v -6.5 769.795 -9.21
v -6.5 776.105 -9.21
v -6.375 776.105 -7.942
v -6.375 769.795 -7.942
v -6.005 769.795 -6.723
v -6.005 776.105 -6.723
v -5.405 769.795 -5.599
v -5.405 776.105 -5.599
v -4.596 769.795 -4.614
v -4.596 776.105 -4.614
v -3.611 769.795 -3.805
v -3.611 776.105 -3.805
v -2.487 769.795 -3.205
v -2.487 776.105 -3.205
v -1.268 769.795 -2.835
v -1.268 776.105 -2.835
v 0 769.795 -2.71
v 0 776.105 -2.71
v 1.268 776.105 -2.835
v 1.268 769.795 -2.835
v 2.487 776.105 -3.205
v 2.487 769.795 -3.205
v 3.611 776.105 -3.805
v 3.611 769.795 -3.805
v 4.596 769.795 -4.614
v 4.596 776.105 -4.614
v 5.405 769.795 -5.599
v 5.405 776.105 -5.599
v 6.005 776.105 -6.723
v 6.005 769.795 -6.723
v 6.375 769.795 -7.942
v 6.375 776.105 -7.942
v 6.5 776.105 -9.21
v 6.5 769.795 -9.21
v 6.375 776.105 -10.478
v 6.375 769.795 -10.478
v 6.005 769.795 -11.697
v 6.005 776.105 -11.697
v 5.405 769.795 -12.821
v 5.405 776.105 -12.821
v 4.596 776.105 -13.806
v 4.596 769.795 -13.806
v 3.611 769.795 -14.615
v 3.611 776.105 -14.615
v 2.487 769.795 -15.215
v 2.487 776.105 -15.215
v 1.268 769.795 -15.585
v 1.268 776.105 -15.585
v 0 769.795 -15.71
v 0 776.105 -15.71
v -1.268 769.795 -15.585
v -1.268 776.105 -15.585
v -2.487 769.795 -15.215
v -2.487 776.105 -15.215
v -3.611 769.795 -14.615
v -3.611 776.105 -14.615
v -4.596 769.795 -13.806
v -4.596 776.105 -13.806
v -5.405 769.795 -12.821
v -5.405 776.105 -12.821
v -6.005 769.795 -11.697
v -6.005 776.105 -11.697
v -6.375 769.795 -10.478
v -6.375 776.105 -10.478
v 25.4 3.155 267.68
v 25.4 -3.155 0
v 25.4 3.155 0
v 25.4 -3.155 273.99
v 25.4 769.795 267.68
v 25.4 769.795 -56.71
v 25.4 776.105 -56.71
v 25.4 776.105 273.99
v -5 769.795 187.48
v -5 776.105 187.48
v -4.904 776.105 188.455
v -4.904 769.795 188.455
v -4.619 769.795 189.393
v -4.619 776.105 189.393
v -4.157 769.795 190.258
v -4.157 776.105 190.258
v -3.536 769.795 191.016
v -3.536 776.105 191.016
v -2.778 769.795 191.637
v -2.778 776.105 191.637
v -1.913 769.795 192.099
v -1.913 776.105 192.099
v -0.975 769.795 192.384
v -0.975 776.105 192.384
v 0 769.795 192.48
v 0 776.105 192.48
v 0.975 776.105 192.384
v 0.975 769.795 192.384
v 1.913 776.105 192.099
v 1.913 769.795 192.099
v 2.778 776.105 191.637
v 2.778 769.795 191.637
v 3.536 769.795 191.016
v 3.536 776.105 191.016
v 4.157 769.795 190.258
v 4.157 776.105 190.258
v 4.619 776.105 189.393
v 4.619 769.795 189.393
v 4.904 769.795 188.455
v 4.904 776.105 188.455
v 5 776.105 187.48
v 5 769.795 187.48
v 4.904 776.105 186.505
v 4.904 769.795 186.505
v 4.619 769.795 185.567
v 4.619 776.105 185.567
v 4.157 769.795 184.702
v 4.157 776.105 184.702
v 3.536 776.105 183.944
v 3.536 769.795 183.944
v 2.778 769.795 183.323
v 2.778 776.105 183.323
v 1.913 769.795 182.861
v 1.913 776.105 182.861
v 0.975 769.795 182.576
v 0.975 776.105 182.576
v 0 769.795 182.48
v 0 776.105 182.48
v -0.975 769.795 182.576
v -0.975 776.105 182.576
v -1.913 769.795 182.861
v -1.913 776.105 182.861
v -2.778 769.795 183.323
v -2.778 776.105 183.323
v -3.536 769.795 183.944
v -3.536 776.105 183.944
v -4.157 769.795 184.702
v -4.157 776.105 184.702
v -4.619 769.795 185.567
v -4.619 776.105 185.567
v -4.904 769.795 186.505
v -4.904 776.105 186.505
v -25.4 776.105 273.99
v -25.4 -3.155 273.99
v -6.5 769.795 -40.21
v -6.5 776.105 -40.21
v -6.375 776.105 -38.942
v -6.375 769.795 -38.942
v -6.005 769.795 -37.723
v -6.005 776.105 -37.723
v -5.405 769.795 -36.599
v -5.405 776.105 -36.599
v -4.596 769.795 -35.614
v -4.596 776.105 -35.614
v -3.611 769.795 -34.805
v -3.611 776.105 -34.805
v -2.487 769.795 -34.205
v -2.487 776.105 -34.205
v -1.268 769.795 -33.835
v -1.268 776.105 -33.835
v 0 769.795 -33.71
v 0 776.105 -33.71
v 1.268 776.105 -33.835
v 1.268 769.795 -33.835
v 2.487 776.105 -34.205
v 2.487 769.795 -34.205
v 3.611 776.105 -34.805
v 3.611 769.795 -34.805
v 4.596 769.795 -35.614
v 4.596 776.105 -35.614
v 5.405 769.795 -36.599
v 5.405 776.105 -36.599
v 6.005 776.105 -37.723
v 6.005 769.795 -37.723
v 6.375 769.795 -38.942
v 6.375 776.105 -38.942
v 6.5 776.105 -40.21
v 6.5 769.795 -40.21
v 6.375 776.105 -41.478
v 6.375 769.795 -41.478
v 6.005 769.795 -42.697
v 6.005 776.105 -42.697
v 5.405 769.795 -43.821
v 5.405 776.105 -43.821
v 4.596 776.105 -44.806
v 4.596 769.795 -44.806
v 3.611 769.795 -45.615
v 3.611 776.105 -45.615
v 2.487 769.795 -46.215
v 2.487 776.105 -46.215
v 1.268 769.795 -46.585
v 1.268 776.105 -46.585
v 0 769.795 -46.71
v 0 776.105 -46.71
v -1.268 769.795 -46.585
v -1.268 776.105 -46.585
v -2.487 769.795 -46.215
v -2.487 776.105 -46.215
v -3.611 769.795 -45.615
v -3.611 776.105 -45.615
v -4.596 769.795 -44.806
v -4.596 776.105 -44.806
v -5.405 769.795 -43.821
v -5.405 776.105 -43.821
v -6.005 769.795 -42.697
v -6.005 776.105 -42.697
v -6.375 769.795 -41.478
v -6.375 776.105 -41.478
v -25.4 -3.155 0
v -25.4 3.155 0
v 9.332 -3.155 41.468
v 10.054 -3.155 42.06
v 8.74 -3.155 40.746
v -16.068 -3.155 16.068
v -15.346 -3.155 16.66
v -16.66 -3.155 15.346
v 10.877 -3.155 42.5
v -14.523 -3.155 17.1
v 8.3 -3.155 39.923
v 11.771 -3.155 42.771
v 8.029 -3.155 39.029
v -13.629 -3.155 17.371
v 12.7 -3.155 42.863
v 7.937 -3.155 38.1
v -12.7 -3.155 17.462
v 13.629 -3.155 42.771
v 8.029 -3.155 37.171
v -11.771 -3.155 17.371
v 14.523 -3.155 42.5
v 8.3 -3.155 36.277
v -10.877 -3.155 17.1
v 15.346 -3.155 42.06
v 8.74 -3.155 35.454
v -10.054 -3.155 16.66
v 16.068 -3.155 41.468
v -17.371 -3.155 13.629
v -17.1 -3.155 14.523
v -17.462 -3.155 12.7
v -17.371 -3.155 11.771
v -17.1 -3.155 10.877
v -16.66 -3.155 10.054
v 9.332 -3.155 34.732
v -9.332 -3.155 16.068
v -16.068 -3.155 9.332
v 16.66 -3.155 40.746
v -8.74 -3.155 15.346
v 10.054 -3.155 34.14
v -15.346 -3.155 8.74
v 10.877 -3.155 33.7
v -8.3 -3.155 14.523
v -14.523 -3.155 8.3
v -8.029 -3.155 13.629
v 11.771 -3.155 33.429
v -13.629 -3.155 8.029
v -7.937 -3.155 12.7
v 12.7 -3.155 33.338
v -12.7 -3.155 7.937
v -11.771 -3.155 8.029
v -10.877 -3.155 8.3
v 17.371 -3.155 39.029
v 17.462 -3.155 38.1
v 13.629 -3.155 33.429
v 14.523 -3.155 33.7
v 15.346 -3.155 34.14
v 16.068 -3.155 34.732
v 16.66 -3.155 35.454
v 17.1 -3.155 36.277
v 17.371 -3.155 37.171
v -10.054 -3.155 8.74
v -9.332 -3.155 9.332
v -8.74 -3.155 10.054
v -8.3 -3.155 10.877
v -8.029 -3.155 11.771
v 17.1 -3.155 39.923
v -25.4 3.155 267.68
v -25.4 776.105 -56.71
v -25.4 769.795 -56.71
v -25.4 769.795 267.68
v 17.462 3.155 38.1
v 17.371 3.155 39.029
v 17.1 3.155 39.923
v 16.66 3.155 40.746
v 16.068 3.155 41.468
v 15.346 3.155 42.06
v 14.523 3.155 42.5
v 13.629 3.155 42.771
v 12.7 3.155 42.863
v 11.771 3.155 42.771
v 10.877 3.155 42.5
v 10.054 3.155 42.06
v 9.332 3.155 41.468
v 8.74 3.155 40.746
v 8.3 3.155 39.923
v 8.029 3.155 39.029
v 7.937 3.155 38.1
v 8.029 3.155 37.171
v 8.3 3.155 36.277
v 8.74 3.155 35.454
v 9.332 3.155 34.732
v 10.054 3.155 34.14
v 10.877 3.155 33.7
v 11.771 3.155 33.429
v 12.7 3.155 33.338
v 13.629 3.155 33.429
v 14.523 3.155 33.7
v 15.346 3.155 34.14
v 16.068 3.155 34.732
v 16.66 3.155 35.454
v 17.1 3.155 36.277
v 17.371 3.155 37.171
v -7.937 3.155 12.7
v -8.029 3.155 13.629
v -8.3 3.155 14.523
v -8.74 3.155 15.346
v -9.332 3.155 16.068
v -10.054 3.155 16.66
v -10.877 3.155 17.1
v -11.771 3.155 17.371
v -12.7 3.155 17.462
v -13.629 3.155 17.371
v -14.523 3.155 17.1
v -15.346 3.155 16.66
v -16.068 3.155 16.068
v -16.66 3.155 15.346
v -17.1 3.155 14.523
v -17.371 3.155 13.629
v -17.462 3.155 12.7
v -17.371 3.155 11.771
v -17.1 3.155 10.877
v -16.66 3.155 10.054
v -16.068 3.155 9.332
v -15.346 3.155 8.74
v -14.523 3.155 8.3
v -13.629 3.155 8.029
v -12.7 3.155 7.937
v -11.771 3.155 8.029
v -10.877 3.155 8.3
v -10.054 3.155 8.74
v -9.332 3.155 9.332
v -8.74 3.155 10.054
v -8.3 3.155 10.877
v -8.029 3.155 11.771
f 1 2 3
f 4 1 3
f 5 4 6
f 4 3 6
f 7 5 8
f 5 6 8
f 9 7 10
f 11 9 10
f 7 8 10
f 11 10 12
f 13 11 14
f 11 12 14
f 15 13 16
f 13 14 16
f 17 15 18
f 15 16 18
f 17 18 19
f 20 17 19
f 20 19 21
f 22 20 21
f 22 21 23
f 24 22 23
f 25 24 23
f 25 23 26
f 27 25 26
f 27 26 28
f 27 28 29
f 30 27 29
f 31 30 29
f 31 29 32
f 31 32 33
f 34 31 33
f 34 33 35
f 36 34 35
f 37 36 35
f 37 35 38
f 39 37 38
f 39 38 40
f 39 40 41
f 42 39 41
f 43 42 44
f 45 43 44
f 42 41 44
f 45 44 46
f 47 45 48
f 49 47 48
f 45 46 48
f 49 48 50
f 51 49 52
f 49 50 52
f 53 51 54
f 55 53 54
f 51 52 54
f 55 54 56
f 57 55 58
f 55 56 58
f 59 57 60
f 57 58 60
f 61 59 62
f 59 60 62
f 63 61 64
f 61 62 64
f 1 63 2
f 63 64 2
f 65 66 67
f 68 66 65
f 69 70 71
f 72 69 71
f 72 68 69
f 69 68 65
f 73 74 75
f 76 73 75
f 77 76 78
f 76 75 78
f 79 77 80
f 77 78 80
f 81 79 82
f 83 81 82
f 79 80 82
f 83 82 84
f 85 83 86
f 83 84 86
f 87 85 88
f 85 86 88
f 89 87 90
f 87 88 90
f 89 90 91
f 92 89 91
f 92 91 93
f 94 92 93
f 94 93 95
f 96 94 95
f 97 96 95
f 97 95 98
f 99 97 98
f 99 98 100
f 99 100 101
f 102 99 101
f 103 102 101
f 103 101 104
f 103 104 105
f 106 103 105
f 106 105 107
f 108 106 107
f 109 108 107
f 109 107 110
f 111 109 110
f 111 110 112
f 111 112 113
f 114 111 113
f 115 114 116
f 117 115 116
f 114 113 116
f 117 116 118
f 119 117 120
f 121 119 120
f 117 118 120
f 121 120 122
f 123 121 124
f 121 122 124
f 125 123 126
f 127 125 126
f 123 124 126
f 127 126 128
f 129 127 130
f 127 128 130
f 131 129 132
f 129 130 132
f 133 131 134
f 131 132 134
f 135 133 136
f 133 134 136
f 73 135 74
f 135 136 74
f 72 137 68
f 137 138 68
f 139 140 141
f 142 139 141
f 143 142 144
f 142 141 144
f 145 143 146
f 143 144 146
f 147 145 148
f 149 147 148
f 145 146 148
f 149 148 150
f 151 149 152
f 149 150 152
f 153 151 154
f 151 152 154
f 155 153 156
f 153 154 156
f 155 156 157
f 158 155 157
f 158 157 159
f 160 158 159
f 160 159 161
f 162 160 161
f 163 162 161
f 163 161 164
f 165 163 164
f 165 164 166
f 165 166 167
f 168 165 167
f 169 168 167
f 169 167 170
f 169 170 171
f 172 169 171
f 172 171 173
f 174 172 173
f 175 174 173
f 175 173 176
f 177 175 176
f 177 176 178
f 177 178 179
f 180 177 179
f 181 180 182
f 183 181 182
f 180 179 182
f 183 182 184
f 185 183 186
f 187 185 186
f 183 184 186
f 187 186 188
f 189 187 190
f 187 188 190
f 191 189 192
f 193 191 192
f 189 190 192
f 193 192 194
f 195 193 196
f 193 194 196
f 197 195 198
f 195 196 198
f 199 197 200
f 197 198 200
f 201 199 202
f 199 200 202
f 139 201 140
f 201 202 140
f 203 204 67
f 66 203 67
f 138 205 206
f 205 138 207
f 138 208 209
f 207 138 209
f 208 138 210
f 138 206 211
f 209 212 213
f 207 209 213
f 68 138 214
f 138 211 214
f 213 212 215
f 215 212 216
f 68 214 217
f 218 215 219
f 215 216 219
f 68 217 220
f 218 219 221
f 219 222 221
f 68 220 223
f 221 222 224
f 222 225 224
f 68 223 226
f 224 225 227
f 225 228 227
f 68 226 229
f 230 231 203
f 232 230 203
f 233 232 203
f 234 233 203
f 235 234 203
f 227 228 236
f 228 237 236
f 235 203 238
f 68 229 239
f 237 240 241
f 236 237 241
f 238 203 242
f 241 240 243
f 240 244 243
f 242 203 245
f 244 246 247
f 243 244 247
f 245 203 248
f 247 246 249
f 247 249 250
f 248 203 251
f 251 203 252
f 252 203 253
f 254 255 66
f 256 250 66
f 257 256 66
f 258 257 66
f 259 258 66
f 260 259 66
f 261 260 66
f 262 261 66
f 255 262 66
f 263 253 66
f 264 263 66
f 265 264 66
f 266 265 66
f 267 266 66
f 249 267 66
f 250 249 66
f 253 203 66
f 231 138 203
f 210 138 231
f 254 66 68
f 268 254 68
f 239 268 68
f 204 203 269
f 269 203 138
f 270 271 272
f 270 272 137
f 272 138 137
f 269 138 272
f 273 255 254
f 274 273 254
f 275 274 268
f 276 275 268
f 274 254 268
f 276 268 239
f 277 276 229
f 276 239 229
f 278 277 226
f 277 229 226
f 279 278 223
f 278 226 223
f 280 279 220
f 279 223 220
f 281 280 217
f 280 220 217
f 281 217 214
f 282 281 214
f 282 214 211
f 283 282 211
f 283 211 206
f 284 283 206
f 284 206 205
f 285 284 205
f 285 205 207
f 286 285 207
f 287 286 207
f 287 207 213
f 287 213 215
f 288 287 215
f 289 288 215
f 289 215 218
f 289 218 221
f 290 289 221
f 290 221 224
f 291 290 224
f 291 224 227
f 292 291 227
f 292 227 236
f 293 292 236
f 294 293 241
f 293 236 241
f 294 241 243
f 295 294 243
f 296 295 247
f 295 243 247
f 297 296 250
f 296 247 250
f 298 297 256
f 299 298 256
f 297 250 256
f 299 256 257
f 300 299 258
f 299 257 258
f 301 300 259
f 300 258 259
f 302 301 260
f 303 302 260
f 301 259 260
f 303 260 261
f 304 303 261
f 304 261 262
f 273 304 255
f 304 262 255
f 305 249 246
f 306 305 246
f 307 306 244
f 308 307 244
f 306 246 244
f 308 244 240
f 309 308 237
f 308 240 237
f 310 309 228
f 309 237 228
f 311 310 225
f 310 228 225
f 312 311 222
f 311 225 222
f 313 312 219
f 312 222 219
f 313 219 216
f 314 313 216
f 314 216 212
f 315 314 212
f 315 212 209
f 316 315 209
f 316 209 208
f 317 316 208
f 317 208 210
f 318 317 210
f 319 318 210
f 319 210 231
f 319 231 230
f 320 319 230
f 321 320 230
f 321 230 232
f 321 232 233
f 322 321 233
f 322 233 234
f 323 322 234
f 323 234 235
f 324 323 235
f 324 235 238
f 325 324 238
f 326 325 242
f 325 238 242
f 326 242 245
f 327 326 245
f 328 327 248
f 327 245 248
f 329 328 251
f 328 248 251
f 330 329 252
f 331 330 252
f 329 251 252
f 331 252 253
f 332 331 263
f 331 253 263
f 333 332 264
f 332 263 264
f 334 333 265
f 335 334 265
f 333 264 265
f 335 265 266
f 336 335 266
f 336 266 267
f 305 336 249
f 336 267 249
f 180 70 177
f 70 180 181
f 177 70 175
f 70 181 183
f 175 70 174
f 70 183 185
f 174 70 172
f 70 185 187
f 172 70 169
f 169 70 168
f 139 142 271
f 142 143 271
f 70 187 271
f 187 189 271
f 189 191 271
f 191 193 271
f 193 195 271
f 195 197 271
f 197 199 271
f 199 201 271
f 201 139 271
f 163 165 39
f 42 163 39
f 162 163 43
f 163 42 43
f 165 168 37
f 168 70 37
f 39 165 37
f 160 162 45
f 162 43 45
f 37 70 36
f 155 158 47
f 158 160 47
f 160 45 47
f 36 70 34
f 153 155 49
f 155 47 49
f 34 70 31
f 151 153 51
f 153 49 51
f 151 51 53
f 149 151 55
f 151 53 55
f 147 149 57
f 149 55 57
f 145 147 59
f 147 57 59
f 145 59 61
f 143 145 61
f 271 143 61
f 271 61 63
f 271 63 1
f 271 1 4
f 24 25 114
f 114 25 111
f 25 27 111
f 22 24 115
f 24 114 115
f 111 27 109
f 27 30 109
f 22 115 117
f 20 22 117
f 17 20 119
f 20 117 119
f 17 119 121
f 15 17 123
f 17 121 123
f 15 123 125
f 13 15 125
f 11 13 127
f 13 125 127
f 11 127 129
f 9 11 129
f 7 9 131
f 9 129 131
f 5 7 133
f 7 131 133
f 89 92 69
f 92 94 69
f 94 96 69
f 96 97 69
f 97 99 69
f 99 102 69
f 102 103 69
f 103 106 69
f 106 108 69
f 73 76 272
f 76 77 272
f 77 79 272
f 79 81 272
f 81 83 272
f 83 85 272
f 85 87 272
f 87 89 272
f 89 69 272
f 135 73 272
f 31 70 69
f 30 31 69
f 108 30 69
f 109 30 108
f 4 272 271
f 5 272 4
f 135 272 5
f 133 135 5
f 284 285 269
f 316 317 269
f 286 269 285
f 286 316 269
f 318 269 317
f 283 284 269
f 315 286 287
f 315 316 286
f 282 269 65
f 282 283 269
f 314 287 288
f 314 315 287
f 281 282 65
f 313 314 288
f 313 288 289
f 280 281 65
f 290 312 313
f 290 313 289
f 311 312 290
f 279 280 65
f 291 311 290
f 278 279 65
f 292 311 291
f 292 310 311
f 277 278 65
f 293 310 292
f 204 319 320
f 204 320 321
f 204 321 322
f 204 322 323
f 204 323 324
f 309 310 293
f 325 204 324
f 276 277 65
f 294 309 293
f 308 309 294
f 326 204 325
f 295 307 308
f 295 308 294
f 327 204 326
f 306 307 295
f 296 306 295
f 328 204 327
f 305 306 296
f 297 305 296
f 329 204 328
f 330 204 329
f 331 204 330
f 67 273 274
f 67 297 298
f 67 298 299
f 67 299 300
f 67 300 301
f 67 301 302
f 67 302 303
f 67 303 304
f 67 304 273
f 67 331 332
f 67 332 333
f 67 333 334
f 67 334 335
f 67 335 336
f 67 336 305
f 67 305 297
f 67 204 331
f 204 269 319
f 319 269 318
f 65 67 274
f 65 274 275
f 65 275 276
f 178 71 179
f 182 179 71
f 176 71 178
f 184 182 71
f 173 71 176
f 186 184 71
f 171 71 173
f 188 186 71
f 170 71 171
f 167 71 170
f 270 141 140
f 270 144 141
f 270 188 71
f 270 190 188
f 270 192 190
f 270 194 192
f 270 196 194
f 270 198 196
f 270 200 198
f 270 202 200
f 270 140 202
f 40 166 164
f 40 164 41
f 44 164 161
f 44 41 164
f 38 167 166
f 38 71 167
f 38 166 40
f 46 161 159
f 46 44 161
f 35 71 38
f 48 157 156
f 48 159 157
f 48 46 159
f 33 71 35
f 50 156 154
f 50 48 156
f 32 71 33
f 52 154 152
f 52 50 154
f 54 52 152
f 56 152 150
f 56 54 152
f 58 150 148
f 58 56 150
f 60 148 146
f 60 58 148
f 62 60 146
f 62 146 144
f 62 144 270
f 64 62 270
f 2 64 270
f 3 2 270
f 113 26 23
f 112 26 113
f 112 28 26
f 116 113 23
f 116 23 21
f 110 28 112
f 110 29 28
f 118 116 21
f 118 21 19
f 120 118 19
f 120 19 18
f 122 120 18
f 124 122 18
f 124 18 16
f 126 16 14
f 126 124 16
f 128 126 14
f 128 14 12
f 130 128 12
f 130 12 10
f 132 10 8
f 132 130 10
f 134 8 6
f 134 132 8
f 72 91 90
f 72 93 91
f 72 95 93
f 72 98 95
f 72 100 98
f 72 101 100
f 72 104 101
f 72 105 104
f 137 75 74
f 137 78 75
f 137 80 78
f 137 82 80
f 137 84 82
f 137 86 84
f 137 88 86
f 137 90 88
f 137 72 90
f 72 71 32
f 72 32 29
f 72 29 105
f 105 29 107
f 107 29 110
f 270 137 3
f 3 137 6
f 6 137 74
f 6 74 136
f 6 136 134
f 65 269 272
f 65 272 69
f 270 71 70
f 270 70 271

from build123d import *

# Parameters (mm, degrees)
CROQUIS1_W              = 50.8
CROQUIS1_H              = 6.31
SALIENTE_EXTRUIR1_DEPTH = 273.99
CROQUIS2_W              = 50.8
CROQUIS2_H              = 6.31
SALIENTE_EXTRUIR2_DEPTH = 772.95
CROQUIS3_W              = 50.8
CROQUIS3_H              = 6.31
SALIENTE_EXTRUIR3_DEPTH = 324.39
CROQUIS4_R              = 4.7625
CORTAR_EXTRUIR1_DEPTH   = 10
CROQUIS5_R              = 6.5
CORTAR_EXTRUIR2_DEPTH   = 10
CROQUIS6_R              = 5
CORTAR_EXTRUIR3_DEPTH   = 35


with BuildPart() as part:
    # Croquis1 → Saliente-Extruir1 (new body)
    with BuildSketch(Plane.XY):
        Rectangle(CROQUIS1_W, CROQUIS1_H)
    extrude(amount=SALIENTE_EXTRUIR1_DEPTH)

    # Croquis2 → Saliente-Extruir2 (add)
    with BuildSketch(Plane(origin=(0, 3.155, 0), x_dir=(1, 0, 0), z_dir=(0, 1, 0))):
        with Locations((0, -270.835)):
            Rectangle(CROQUIS2_W, CROQUIS2_H)
    extrude(amount=SALIENTE_EXTRUIR2_DEPTH)

    # Croquis3 → Saliente-Extruir3 (add)
    with BuildSketch(Plane(origin=(0, 0, 267.68), x_dir=(-1, 0, 0), z_dir=(0, 0, -1))):
        with Locations((0, 772.95)):
            Rectangle(CROQUIS3_W, CROQUIS3_H)
    extrude(amount=SALIENTE_EXTRUIR3_DEPTH)

    # Croquis4 → Cortar-Extruir1 (cut)
    with BuildSketch(Plane.XZ.offset(3.155)):
        with Locations((-12.7, 12.7)):
            Circle(CROQUIS4_R)
        with Locations((12.7, 38.1)):
            Circle(CROQUIS4_R)
    extrude(amount=-CORTAR_EXTRUIR1_DEPTH, mode=Mode.SUBTRACT)

    # Croquis5 → Cortar-Extruir2 (cut)
    with BuildSketch(Plane(origin=(0, 776.105, 0), x_dir=(1, 0, 0), z_dir=(0, 1, 0))):
        with Locations(Location((0, 40.21, 0), (0, 0, 180))):
            Circle(CROQUIS5_R)
        with Locations(Location((0, 9.21, 0), (0, 0, 180))):
            Circle(CROQUIS5_R)
    extrude(amount=-CORTAR_EXTRUIR2_DEPTH, mode=Mode.SUBTRACT)

    # Croquis6 → Cortar-Extruir3 (cut)
    with BuildSketch(Plane(origin=(0, 776.105, 0), x_dir=(1, 0, 0), z_dir=(0, 1, 0))):
        with Locations(Location((0, -187.48, 0), (0, 0, 180))):
            Circle(CROQUIS6_R)
    extrude(amount=-CORTAR_EXTRUIR3_DEPTH, mode=Mode.SUBTRACT)


solid = part.part
